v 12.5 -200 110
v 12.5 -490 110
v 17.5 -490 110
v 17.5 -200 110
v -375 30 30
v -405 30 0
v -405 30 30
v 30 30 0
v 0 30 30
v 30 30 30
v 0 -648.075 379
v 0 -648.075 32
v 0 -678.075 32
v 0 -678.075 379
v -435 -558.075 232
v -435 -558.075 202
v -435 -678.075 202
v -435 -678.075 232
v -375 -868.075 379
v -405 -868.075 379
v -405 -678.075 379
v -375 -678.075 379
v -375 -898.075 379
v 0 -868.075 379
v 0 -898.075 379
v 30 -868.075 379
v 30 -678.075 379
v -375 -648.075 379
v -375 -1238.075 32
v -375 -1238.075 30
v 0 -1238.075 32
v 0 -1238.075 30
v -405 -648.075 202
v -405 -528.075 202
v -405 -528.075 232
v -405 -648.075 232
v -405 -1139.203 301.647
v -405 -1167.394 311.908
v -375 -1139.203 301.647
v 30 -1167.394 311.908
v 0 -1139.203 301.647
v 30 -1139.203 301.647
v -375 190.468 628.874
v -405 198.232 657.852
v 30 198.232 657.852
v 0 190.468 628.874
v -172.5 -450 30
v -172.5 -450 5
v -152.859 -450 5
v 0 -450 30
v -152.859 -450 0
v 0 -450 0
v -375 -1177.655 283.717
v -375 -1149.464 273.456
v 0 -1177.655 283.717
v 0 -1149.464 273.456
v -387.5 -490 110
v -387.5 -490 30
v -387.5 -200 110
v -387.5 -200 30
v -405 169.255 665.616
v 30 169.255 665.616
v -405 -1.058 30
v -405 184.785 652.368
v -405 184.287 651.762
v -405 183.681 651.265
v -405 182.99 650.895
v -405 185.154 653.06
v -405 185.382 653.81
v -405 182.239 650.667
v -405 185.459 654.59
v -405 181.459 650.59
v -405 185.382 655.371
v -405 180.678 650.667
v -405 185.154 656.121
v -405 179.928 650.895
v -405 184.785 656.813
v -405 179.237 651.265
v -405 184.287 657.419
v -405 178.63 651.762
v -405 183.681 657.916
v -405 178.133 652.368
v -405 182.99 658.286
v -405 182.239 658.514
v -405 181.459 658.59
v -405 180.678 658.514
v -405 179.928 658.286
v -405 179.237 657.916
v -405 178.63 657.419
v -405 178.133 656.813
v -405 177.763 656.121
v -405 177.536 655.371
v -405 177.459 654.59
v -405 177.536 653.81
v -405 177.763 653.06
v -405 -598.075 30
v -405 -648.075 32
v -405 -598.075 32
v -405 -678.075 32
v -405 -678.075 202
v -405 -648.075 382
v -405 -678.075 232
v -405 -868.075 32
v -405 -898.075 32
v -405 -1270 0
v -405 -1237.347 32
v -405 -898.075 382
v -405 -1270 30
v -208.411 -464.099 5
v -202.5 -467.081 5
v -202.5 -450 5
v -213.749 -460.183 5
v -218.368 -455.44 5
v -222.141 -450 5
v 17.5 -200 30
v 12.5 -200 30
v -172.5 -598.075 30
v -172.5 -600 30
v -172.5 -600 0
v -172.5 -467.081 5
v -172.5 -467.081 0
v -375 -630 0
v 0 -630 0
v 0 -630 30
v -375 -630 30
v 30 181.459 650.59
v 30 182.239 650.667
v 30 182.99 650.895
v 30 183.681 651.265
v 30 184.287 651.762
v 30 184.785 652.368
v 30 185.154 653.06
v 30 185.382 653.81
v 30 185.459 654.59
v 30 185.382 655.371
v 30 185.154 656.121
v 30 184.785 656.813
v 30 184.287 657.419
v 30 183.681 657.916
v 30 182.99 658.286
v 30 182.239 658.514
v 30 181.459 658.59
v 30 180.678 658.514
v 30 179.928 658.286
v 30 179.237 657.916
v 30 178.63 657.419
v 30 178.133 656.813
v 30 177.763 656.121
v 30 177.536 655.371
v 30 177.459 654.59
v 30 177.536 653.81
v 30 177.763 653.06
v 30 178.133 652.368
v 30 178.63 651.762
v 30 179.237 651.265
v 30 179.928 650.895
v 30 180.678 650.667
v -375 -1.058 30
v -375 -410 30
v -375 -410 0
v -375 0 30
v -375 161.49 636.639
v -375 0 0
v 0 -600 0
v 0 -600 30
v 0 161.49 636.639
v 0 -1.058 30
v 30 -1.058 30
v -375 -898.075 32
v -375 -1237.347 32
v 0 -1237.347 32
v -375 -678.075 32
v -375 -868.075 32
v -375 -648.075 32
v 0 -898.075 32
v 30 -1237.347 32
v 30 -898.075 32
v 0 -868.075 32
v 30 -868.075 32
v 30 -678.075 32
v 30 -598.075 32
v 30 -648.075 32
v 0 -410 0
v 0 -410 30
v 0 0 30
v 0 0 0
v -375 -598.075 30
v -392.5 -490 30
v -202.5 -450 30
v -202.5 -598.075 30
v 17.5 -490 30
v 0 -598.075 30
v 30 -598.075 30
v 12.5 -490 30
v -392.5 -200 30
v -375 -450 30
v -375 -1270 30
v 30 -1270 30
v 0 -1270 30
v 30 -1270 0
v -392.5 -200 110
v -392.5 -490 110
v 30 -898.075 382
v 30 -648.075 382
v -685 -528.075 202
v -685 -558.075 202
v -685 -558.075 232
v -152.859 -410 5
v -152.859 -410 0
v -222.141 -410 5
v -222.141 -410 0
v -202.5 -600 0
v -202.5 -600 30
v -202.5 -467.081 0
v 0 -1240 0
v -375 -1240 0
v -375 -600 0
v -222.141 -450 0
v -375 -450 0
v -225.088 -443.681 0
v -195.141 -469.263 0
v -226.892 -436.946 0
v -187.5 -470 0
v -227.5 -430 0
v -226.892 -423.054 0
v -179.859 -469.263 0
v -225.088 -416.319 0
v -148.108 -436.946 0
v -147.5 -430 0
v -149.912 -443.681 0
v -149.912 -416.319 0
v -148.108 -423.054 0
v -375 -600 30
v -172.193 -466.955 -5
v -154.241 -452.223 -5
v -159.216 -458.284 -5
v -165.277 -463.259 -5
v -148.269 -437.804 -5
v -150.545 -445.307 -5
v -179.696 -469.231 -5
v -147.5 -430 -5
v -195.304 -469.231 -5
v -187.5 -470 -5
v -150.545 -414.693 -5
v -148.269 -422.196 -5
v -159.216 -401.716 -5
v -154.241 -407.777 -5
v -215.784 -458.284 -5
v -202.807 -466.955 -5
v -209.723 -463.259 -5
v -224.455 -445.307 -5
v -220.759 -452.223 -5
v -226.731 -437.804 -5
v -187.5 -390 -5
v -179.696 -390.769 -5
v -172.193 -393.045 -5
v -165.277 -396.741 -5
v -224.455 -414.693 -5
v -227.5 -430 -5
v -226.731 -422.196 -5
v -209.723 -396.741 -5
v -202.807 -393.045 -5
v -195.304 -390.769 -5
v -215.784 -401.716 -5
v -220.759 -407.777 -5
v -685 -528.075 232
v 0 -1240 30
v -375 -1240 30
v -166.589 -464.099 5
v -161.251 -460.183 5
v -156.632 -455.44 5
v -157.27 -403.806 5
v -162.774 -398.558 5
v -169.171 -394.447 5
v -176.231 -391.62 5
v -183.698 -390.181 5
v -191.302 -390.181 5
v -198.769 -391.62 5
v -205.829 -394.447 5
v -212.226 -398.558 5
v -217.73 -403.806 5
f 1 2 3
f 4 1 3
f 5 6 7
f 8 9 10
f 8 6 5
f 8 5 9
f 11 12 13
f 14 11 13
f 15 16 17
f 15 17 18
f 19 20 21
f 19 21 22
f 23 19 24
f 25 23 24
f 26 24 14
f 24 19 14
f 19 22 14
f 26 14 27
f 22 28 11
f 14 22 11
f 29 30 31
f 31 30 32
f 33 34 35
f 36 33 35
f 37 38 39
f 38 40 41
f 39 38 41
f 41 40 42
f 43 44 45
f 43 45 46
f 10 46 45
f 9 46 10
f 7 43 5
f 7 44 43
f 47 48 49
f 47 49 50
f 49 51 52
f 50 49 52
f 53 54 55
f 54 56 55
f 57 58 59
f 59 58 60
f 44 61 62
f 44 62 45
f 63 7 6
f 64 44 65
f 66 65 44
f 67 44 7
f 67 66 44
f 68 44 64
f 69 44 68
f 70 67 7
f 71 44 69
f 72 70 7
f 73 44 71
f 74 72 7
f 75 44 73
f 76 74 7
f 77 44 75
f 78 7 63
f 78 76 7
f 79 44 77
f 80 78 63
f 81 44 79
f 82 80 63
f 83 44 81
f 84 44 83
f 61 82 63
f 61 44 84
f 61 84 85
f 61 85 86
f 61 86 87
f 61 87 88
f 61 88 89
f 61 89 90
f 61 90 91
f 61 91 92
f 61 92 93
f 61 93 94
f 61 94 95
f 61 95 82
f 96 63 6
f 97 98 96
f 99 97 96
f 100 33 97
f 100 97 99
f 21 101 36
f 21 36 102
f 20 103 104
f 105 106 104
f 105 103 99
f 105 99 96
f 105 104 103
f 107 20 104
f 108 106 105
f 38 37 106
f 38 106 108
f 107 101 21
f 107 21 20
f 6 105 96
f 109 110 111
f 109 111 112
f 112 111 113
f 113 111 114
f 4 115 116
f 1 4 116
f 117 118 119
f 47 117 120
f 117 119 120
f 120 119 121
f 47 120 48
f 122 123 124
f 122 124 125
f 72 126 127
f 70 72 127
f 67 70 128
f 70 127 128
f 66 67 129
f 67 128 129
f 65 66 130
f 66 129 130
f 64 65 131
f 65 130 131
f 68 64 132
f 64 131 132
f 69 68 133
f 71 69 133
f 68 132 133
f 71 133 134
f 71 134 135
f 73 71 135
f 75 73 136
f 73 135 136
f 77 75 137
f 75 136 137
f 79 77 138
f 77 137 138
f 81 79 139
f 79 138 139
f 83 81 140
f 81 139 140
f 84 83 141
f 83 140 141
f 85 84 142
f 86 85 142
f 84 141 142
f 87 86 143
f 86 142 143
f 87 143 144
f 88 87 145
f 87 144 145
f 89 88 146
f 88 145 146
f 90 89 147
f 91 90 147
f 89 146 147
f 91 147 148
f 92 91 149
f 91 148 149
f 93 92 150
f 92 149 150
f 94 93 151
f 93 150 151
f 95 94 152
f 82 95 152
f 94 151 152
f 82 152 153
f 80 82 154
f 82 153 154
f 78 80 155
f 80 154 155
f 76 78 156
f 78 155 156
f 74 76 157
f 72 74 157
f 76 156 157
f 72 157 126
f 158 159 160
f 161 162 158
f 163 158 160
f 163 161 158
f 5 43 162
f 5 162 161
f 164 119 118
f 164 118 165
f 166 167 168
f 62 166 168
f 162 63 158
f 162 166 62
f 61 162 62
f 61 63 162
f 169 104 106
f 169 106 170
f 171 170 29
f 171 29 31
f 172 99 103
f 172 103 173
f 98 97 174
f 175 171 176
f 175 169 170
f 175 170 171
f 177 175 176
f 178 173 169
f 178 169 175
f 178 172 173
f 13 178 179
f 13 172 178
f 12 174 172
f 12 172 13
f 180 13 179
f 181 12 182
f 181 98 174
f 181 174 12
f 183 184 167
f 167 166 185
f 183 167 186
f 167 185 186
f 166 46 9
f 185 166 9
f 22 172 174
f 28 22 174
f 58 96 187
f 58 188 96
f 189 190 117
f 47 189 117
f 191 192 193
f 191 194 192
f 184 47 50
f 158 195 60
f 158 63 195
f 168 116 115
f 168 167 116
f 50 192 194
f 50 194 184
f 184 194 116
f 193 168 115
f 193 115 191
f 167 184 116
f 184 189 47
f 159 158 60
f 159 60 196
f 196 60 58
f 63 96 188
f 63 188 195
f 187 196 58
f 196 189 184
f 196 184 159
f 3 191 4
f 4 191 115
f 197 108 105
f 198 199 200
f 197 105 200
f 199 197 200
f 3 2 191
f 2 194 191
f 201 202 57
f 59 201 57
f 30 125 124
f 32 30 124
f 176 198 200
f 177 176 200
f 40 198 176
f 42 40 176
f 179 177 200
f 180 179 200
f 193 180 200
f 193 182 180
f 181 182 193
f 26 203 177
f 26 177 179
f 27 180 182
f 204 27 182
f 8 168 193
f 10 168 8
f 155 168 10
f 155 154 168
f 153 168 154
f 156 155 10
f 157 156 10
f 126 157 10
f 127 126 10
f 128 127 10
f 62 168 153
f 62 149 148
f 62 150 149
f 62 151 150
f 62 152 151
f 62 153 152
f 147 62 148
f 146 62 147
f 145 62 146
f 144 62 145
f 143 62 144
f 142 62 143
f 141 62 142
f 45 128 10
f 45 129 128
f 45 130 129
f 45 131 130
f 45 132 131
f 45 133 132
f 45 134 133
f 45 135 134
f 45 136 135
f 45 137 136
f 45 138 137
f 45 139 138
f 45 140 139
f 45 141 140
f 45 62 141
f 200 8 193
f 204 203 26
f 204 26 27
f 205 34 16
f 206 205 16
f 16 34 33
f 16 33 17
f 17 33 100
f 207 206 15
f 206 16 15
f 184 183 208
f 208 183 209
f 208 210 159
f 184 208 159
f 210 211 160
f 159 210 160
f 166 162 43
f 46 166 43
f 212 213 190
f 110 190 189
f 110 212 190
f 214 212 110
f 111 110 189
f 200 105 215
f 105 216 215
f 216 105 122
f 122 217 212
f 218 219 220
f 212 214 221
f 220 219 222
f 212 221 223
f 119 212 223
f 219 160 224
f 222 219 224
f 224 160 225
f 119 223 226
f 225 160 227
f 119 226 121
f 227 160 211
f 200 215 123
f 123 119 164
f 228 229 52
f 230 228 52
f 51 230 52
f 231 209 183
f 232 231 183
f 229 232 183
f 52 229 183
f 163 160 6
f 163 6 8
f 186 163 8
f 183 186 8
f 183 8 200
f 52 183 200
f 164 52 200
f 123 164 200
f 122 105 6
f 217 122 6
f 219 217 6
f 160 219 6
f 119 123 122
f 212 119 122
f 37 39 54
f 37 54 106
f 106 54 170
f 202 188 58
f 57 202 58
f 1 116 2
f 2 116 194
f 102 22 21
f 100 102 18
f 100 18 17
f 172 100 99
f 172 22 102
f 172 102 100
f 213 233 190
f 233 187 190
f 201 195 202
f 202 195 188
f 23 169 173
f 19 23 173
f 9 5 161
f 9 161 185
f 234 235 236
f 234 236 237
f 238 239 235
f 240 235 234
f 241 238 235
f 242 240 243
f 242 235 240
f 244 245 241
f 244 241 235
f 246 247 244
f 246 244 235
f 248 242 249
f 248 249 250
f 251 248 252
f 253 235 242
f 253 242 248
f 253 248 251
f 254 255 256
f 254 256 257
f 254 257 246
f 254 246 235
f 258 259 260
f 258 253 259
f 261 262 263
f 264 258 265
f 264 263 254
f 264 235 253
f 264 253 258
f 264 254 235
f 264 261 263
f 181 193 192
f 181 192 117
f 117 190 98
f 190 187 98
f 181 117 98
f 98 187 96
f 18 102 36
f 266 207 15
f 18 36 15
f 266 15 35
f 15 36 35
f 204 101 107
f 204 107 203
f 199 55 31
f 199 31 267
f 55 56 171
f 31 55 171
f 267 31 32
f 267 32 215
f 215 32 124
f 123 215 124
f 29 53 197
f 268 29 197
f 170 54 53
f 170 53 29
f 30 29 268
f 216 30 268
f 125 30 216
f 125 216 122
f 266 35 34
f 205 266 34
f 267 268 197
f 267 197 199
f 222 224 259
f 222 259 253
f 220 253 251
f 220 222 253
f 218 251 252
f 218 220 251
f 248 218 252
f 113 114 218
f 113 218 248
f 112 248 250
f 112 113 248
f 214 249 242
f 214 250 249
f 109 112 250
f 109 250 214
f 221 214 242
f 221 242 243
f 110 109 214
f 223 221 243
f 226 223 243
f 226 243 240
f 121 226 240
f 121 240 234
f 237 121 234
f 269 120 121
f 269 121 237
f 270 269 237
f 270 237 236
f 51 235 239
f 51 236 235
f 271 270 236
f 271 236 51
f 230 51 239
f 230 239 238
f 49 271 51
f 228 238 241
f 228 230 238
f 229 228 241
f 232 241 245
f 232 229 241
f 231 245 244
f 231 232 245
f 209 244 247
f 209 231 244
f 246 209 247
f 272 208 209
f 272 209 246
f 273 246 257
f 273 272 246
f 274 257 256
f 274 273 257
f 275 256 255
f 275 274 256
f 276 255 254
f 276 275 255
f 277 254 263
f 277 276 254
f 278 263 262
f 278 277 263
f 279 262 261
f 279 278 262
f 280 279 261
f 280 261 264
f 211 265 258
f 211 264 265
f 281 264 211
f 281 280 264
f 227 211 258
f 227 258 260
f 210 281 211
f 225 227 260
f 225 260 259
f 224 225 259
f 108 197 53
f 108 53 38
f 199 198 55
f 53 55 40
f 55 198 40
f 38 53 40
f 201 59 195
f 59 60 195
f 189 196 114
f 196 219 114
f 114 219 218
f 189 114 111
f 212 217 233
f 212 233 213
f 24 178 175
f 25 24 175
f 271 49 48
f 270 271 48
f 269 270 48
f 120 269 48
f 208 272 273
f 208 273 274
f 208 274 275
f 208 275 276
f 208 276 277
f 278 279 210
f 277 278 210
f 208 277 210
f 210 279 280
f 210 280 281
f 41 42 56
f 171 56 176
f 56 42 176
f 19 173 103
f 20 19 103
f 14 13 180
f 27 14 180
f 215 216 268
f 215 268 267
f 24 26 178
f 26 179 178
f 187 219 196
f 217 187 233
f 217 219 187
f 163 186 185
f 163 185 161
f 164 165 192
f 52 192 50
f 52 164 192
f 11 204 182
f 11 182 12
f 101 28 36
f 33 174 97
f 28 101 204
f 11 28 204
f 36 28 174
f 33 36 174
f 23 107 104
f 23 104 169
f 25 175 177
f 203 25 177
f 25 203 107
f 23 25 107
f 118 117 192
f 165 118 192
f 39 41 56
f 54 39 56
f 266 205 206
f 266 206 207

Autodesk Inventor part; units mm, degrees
ref_plane "YZ Plane" through (0, 0, 0) normal (1, 0, 0) x (0, 1, 0)
ref_plane "XZ Plane" through (0, 0, 0) normal (0, 1, 0) x (-1, 0, 0)
ref_plane "XY Plane" through (0, 0, 0) normal (0, 0, 1) x (1, 0, 0)
sketch "Sketch1" plane through (0, 0, 0) normal (0, 0, 1) x (1, 0, 0)
  line L0 (0, 0) -> (-375, 0)
  line L1 (-375, 0) -> (-375, -600)
  line L2 (-375, -600) -> (0, -600)
  line L3 (0, -600) -> (0, 0)
  line L4 (-405, 30) -> (30, 30)
  line L5 (30, 30) -> (30, -630)
  line L6 (30, -630) -> (-405, -630)
  line L7 (-405, -630) -> (-405, 30)
  line L8 (-405, -630) -> (-375, -630)
  line L9 (-375, -630) -> (-375, -1270)
  line L10 (-375, -1270) -> (-405, -1270)
  line L11 (-405, -1270) -> (-405, -630)
  line L12 (30, -630) -> (0, -630)
  line L13 (0, -630) -> (0, -1270)
  line L14 (0, -1270) -> (30, -1270)
  line L15 (30, -1270) -> (30, -630)
  line L16 (-375, -1270) -> (0, -1270)
  line L17 (0, -1270) -> (0, -1240)
  line L18 (0, -1240) -> (-375, -1240)
  line L19 (-375, -1240) -> (-375, -1270)
  dimension "d0" = 375
  dimension "d1" = 600
  dimension "d2" = 30
  dimension "d3" = 30
  dimension "d4" = 30
  dimension "d5" = 30
  dimension "d38" = 30
  dimension "d39" = 640
  dimension "d40" = 30
  dimension "d41" = 640
  dimension "d42" = 30
extrude "Extrusion1" add sketch "Sketch1" along normal blind 30 contours L4 L5 L6 L7
sketch "Sketch2" plane through (0, 0, 0) normal (0, 0, -1) x (-1, 0, 0)
  line L0 (375, -600) -> (375, 0) projected
  line L1 (375, -450) -> (0, -450)
  line L2 (0, -450) -> (0, -410)
  line L3 (0, -410) -> (375, -410)
  line L4 (375, -410) -> (375, -450)
  line L5 (0, -600) -> (375, -600) projected
  line L6 (202.5, -600) -> (202.5, -450)
  line L7 (172.5, -600) -> (172.5, -450)
  point P0 (0, 0)
  dimension "d8" = 375
  dimension "d9" = 40
  dimension "d10" = 150
extrude "Extrusion2" add sketch "Sketch2" against normal blind 30 contours L1 L2 L3 L0 | L5 L7 L1 L6
sketch "Sketch3" plane through (0, 0, 30) normal (0, 0, 1) x (1, 0, 0)
  line L0 (12.5, -490) -> (17.5, -490)
  line L1 (17.5, -490) -> (17.5, -200)
  line L2 (17.5, -200) -> (12.5, -200)
  line L3 (12.5, -200) -> (12.5, -490)
  line L4 (0, -410) -> (-375, -410) projected
  line L5 (-392.5, -490) -> (-387.5, -490)
  line L6 (-387.5, -490) -> (-387.5, -200)
  line L7 (-387.5, -200) -> (-392.5, -200)
  line L8 (-392.5, -200) -> (-392.5, -490)
  line L9 (0, -600) -> (-172.5, -600) projected
  point P0 (0, 0)
  dimension "d13" = 5
  dimension "d14" = 290
  dimension "d18" = 405
  dimension "d37" = 110
extrude "Extrusion3" add sketch "Sketch3" along normal blind 80
sketch "Sketch4" plane through (30, -630, 0) normal (1, 0, 0) x (0, 0, -1)
  line L0 (-30, 0) -> (-30, 660) projected
  line L1 (-30, 660) -> (-657.8518, 828.2324)
  line L2 (-30, 660) -> (620, 660) construction
  line L3 (-657.8518, 828.2324) -> (-665.6164, 799.2546)
  line L4 (-665.6164, 799.2546) -> (-30, 628.9417)
  point P0 (0, 630)
  dimension "d25" = 650
  dimension "d26" = 165
  dimension "d27" = 30
  dimension "d28" = 270
extrude "Extrusion4" add sketch "Sketch4" against normal blind 30
pattern_linear "Rectangular Pattern1" count 2 spacing 405 along (-1, 0, 0) of "Extrusion4"
sketch "Sketch5" plane through (-375, 0, 30) normal (1, 0, 0) x (0, 0, -1)
  line L0 (-635.6164, 169.2546) -> (-627.8518, 198.2324) projected
  line L1 (0, -1.0583) -> (-635.6164, 169.2546) projected
  line L2 (-627.8518, 198.2324) -> (-635.6164, 169.2546)
  line L3 (-635.6164, 169.2546) -> (-606.6386, 161.49)
  line L4 (-606.6386, 161.49) -> (-598.874, 190.4678)
  line L5 (-627.8518, 198.2324) -> (0, 30) projected
  line L6 (-627.8518, 198.2324) -> (-598.874, 190.4678)
  point P0 (30, 0)
  dimension "d34" = 30
extrude "Extrusion5" add sketch "Sketch5" along normal up to surface (375 mm away)
sketch "Sketch6" plane through (0, 0, 0) normal (0, 0, -1) x (-1, 0, 0)
  line L0 (0, -630) -> (0, -1270)
  line L1 (0, -1270) -> (-30, -1270)
  line L2 (-30, -1270) -> (-30, -630)
  line L3 (375, -630) -> (375, -1270)
  line L4 (375, -1270) -> (405, -1270)
  line L5 (405, -1270) -> (405, -630)
  line L6 (0, -1270) -> (375, -1270)
  line L7 (375, -1270) -> (375, -1240)
  line L8 (375, -1240) -> (0, -1240)
  line L9 (0, -1240) -> (0, -1270)
  line L10 (405, -1.0583) -> (405, -630) projected
  line L11 (-30, -630) -> (-30, -1.0583) projected
  line L12 (405, -630) -> (375, -630)
  line L13 (405, -630) -> (-30, -630) projected
  line L14 (0, -630) -> (-30, -630)
  point P0 (0, 0)
  dimension "d43" = 30
  dimension "d44" = 640
  dimension "d45" = 30
  dimension "d46" = 640
  dimension "d47" = 30
  dimension "d48" = 0
  dimension "d49" = 0
extrude "Extrusion6" add sketch "Sketch6" against normal blind 30 contours L0 L1 L2 L13 | L8 L3 L6 L0 | L12 L5 L4 L3
sketch "Sketch7" plane through (0, 0, 0) normal (0, 0, -1) x (-1, 0, 0)
  circle A0 centre (187.5, -430) radius 40
  point P0 (0, 0)
  dimension "d52" = 80
extrude "Extrusion7" add sketch "Sketch7" along normal blind 5 and the other way blind 5
sketch "Sketch8" plane through (30, -1270, 0) normal (1, 0, 0) x (0, 0, -1)
  line L0 (0, 0) -> (-30, 0) projected
  line L1 (-30, 0) -> (-311.9078, 102.606)
  line L2 (-30, 0) -> (270, 0) construction
  line L3 (-311.9078, 102.606) -> (-301.6472, 130.7968)
  line L4 (-301.6472, 130.7968) -> (-30, 31.9253)
  line L5 (-30, 640) -> (-30, 30) projected
  line L6 (-30, 31.9253) -> (-30, 0)
  point P0 (0, 1270)
  dimension "d55" = 300
  dimension "d56" = 160
  dimension "d57" = 30
  dimension "d58" = 90
extrude "Extrusion8" add sketch "Sketch8" against normal blind 30
pattern_linear "Rectangular Pattern2" count 2 spacing 405 along (-1, 0, 0) of "Extrusion8"
sketch "Sketch9" plane through (0, -1240, 0) normal (-1, 0, 0) x (0, 0, 1)
  line L0 (311.9078, 72.606) -> (301.6472, 100.7968) projected
  line L1 (311.9078, 72.606) -> (301.6472, 100.7968)
  line L2 (301.6472, 100.7968) -> (273.4564, 90.5362)
  line L3 (30, 1.9253) -> (301.6472, 100.7968) projected
  line L4 (273.4564, 90.5362) -> (283.717, 62.3454)
  line L5 (30, -30) -> (311.9078, 72.606) projected
  line L6 (283.717, 62.3454) -> (311.9078, 72.606)
  point P0 (0, 1240)
  dimension "d64" = 30
extrude "Extrusion9" add sketch "Sketch9" along normal up to surface (375 mm away)
sketch "Sketch10" plane through (0, 0, 30) normal (0, 0, 1) x (1, 0, 0)
  line L0 (-405, -1238.0747) -> (-375, -1238.0747) projected
  line L1 (-405, -1238.0747) -> (30, -1238.0747)
  line L2 (30, -1238.0747) -> (30, -598.0747)
  line L3 (30, -598.0747) -> (-405, -598.0747)
  line L4 (-405, -598.0747) -> (-405, -1238.0747)
  point P0 (0, 0)
  dimension "d67" = 435
  dimension "d68" = 640
extrude "Extrusion10" add sketch "Sketch10" along normal blind 2
sketch "Sketch11" plane through (0, 0, 32) normal (0, 0, 1) x (1, 0, 0)
  line L0 (30, -648.0747) -> (0, -648.0747)
  line L1 (0, -648.0747) -> (0, -678.0747)
  line L2 (0, -678.0747) -> (30, -678.0747)
  line L3 (30, -678.0747) -> (30, -648.0747)
  line L4 (30, -598.0747) -> (-405, -598.0747) projected
  point P0 (0, 0)
  dimension "d71" = 30
  dimension "d72" = 30
  dimension "d73" = 50
extrude "Extrusion11" add sketch "Sketch11" along normal blind 350
pattern_linear "Rectangular Pattern3" count 2 spacing 220 along (0, -1, 0) count 2 spacing 405 along (-1, 0, 0) of "Extrusion11"
sketch "Sketch12" plane through (0, 0, 382) normal (0, 0, 1) x (1, 0, 0)
  line L0 (-405, -868.0747) -> (-405, -898.0747) projected
  line L1 (-405, -898.0747) -> (-375, -898.0747) projected
  line L2 (-375, -898.0747) -> (-375, -868.0747) projected
  line L3 (-375, -868.0747) -> (-405, -868.0747) projected
  line L4 (-405, -648.0747) -> (-405, -678.0747) projected
  line L5 (-405, -678.0747) -> (-375, -678.0747) projected
  line L6 (-375, -678.0747) -> (-375, -648.0747) projected
  line L7 (-375, -648.0747) -> (-405, -648.0747) projected
  line L8 (0, -648.0747) -> (0, -678.0747) projected
  line L9 (0, -678.0747) -> (30, -678.0747) projected
  line L10 (30, -678.0747) -> (30, -648.0747) projected
  line L11 (30, -648.0747) -> (0, -648.0747) projected
  line L12 (0, -868.0747) -> (0, -898.0747) projected
  line L13 (0, -898.0747) -> (30, -898.0747) projected
  line L14 (30, -898.0747) -> (30, -868.0747) projected
  line L15 (30, -868.0747) -> (0, -868.0747) projected
  line L16 (-405, -898.0747) -> (-375, -898.0747) projected
  line L17 (-405, -898.0747) -> (30, -898.0747)
  line L18 (30, -898.0747) -> (30, -648.0747)
  line L19 (30, -648.0747) -> (-405, -648.0747)
  line L20 (-405, -648.0747) -> (-405, -898.0747)
  point P0 (0, 0)
  point P1 (0, -898.0747)
  point P2 (30, -868.0747)
  point P3 (30, -678.0747)
  point P4 (0, -648.0747)
extrude "Extrusion12" add sketch "Sketch12" against normal blind 3 contours L20 L5 L6 L19 L8 L9 L18 L15 L12 L17 L2 L3
sketch "Sketch13" plane through (-405, -1270, 0) normal (-1, 0, 0) x (0, 0, 1)
  line L0 (232, 591.9253) -> (202, 591.9253)
  line L1 (202, 591.9253) -> (202, 741.9253)
  line L2 (202, 741.9253) -> (232, 741.9253)
  line L3 (232, 741.9253) -> (232, 591.9253)
  line L4 (32, 591.9253) -> (379, 591.9253) projected
  line L5 (382, 621.9253) -> (382, 371.9253) projected
  point P0 (0, 1270)
  dimension "d84" = 30
  dimension "d85" = 150
  dimension "d86" = 0
  dimension "d87" = 150
extrude "Extrusion13" add sketch "Sketch13" along normal blind 30
sketch "Sketch14" plane through (-435, -1270, 0) normal (-1, 0, 0) x (0, 0, 1)
  line L0 (232, 741.9253) -> (202, 741.9253) projected
  line L1 (232, 741.9253) -> (202, 741.9253)
  line L2 (202, 741.9253) -> (202, 711.9253)
  line L3 (202, 711.9253) -> (232, 711.9253)
  line L4 (232, 711.9253) -> (232, 741.9253)
  point P0 (0, 1270)
  point P1 (202, 741.9253)
  dimension "d90" = 30
  dimension "d91" = 30
extrude "Extrusion14" add sketch "Sketch14" along normal blind 250
sketch "Sketch15" plane through (30, -1270, 0) normal (1, 0, 0) x (0, 0, -1)
  line L0 (-657.8518, 1468.2324) -> (-665.6164, 1439.2546) construction
  circle A0 centre (-661.7341, 1453.7435) radius 7.5 construction
  circle A1 centre (-654.5905, 1451.4588) radius 4
  point P0 (0, 1270)
  dimension "d96" = 15
  dimension "d97" = 8
extrude "Extrusion15" cut sketch "Sketch15" against normal through all
properties part number "rama pod fotel v2"
